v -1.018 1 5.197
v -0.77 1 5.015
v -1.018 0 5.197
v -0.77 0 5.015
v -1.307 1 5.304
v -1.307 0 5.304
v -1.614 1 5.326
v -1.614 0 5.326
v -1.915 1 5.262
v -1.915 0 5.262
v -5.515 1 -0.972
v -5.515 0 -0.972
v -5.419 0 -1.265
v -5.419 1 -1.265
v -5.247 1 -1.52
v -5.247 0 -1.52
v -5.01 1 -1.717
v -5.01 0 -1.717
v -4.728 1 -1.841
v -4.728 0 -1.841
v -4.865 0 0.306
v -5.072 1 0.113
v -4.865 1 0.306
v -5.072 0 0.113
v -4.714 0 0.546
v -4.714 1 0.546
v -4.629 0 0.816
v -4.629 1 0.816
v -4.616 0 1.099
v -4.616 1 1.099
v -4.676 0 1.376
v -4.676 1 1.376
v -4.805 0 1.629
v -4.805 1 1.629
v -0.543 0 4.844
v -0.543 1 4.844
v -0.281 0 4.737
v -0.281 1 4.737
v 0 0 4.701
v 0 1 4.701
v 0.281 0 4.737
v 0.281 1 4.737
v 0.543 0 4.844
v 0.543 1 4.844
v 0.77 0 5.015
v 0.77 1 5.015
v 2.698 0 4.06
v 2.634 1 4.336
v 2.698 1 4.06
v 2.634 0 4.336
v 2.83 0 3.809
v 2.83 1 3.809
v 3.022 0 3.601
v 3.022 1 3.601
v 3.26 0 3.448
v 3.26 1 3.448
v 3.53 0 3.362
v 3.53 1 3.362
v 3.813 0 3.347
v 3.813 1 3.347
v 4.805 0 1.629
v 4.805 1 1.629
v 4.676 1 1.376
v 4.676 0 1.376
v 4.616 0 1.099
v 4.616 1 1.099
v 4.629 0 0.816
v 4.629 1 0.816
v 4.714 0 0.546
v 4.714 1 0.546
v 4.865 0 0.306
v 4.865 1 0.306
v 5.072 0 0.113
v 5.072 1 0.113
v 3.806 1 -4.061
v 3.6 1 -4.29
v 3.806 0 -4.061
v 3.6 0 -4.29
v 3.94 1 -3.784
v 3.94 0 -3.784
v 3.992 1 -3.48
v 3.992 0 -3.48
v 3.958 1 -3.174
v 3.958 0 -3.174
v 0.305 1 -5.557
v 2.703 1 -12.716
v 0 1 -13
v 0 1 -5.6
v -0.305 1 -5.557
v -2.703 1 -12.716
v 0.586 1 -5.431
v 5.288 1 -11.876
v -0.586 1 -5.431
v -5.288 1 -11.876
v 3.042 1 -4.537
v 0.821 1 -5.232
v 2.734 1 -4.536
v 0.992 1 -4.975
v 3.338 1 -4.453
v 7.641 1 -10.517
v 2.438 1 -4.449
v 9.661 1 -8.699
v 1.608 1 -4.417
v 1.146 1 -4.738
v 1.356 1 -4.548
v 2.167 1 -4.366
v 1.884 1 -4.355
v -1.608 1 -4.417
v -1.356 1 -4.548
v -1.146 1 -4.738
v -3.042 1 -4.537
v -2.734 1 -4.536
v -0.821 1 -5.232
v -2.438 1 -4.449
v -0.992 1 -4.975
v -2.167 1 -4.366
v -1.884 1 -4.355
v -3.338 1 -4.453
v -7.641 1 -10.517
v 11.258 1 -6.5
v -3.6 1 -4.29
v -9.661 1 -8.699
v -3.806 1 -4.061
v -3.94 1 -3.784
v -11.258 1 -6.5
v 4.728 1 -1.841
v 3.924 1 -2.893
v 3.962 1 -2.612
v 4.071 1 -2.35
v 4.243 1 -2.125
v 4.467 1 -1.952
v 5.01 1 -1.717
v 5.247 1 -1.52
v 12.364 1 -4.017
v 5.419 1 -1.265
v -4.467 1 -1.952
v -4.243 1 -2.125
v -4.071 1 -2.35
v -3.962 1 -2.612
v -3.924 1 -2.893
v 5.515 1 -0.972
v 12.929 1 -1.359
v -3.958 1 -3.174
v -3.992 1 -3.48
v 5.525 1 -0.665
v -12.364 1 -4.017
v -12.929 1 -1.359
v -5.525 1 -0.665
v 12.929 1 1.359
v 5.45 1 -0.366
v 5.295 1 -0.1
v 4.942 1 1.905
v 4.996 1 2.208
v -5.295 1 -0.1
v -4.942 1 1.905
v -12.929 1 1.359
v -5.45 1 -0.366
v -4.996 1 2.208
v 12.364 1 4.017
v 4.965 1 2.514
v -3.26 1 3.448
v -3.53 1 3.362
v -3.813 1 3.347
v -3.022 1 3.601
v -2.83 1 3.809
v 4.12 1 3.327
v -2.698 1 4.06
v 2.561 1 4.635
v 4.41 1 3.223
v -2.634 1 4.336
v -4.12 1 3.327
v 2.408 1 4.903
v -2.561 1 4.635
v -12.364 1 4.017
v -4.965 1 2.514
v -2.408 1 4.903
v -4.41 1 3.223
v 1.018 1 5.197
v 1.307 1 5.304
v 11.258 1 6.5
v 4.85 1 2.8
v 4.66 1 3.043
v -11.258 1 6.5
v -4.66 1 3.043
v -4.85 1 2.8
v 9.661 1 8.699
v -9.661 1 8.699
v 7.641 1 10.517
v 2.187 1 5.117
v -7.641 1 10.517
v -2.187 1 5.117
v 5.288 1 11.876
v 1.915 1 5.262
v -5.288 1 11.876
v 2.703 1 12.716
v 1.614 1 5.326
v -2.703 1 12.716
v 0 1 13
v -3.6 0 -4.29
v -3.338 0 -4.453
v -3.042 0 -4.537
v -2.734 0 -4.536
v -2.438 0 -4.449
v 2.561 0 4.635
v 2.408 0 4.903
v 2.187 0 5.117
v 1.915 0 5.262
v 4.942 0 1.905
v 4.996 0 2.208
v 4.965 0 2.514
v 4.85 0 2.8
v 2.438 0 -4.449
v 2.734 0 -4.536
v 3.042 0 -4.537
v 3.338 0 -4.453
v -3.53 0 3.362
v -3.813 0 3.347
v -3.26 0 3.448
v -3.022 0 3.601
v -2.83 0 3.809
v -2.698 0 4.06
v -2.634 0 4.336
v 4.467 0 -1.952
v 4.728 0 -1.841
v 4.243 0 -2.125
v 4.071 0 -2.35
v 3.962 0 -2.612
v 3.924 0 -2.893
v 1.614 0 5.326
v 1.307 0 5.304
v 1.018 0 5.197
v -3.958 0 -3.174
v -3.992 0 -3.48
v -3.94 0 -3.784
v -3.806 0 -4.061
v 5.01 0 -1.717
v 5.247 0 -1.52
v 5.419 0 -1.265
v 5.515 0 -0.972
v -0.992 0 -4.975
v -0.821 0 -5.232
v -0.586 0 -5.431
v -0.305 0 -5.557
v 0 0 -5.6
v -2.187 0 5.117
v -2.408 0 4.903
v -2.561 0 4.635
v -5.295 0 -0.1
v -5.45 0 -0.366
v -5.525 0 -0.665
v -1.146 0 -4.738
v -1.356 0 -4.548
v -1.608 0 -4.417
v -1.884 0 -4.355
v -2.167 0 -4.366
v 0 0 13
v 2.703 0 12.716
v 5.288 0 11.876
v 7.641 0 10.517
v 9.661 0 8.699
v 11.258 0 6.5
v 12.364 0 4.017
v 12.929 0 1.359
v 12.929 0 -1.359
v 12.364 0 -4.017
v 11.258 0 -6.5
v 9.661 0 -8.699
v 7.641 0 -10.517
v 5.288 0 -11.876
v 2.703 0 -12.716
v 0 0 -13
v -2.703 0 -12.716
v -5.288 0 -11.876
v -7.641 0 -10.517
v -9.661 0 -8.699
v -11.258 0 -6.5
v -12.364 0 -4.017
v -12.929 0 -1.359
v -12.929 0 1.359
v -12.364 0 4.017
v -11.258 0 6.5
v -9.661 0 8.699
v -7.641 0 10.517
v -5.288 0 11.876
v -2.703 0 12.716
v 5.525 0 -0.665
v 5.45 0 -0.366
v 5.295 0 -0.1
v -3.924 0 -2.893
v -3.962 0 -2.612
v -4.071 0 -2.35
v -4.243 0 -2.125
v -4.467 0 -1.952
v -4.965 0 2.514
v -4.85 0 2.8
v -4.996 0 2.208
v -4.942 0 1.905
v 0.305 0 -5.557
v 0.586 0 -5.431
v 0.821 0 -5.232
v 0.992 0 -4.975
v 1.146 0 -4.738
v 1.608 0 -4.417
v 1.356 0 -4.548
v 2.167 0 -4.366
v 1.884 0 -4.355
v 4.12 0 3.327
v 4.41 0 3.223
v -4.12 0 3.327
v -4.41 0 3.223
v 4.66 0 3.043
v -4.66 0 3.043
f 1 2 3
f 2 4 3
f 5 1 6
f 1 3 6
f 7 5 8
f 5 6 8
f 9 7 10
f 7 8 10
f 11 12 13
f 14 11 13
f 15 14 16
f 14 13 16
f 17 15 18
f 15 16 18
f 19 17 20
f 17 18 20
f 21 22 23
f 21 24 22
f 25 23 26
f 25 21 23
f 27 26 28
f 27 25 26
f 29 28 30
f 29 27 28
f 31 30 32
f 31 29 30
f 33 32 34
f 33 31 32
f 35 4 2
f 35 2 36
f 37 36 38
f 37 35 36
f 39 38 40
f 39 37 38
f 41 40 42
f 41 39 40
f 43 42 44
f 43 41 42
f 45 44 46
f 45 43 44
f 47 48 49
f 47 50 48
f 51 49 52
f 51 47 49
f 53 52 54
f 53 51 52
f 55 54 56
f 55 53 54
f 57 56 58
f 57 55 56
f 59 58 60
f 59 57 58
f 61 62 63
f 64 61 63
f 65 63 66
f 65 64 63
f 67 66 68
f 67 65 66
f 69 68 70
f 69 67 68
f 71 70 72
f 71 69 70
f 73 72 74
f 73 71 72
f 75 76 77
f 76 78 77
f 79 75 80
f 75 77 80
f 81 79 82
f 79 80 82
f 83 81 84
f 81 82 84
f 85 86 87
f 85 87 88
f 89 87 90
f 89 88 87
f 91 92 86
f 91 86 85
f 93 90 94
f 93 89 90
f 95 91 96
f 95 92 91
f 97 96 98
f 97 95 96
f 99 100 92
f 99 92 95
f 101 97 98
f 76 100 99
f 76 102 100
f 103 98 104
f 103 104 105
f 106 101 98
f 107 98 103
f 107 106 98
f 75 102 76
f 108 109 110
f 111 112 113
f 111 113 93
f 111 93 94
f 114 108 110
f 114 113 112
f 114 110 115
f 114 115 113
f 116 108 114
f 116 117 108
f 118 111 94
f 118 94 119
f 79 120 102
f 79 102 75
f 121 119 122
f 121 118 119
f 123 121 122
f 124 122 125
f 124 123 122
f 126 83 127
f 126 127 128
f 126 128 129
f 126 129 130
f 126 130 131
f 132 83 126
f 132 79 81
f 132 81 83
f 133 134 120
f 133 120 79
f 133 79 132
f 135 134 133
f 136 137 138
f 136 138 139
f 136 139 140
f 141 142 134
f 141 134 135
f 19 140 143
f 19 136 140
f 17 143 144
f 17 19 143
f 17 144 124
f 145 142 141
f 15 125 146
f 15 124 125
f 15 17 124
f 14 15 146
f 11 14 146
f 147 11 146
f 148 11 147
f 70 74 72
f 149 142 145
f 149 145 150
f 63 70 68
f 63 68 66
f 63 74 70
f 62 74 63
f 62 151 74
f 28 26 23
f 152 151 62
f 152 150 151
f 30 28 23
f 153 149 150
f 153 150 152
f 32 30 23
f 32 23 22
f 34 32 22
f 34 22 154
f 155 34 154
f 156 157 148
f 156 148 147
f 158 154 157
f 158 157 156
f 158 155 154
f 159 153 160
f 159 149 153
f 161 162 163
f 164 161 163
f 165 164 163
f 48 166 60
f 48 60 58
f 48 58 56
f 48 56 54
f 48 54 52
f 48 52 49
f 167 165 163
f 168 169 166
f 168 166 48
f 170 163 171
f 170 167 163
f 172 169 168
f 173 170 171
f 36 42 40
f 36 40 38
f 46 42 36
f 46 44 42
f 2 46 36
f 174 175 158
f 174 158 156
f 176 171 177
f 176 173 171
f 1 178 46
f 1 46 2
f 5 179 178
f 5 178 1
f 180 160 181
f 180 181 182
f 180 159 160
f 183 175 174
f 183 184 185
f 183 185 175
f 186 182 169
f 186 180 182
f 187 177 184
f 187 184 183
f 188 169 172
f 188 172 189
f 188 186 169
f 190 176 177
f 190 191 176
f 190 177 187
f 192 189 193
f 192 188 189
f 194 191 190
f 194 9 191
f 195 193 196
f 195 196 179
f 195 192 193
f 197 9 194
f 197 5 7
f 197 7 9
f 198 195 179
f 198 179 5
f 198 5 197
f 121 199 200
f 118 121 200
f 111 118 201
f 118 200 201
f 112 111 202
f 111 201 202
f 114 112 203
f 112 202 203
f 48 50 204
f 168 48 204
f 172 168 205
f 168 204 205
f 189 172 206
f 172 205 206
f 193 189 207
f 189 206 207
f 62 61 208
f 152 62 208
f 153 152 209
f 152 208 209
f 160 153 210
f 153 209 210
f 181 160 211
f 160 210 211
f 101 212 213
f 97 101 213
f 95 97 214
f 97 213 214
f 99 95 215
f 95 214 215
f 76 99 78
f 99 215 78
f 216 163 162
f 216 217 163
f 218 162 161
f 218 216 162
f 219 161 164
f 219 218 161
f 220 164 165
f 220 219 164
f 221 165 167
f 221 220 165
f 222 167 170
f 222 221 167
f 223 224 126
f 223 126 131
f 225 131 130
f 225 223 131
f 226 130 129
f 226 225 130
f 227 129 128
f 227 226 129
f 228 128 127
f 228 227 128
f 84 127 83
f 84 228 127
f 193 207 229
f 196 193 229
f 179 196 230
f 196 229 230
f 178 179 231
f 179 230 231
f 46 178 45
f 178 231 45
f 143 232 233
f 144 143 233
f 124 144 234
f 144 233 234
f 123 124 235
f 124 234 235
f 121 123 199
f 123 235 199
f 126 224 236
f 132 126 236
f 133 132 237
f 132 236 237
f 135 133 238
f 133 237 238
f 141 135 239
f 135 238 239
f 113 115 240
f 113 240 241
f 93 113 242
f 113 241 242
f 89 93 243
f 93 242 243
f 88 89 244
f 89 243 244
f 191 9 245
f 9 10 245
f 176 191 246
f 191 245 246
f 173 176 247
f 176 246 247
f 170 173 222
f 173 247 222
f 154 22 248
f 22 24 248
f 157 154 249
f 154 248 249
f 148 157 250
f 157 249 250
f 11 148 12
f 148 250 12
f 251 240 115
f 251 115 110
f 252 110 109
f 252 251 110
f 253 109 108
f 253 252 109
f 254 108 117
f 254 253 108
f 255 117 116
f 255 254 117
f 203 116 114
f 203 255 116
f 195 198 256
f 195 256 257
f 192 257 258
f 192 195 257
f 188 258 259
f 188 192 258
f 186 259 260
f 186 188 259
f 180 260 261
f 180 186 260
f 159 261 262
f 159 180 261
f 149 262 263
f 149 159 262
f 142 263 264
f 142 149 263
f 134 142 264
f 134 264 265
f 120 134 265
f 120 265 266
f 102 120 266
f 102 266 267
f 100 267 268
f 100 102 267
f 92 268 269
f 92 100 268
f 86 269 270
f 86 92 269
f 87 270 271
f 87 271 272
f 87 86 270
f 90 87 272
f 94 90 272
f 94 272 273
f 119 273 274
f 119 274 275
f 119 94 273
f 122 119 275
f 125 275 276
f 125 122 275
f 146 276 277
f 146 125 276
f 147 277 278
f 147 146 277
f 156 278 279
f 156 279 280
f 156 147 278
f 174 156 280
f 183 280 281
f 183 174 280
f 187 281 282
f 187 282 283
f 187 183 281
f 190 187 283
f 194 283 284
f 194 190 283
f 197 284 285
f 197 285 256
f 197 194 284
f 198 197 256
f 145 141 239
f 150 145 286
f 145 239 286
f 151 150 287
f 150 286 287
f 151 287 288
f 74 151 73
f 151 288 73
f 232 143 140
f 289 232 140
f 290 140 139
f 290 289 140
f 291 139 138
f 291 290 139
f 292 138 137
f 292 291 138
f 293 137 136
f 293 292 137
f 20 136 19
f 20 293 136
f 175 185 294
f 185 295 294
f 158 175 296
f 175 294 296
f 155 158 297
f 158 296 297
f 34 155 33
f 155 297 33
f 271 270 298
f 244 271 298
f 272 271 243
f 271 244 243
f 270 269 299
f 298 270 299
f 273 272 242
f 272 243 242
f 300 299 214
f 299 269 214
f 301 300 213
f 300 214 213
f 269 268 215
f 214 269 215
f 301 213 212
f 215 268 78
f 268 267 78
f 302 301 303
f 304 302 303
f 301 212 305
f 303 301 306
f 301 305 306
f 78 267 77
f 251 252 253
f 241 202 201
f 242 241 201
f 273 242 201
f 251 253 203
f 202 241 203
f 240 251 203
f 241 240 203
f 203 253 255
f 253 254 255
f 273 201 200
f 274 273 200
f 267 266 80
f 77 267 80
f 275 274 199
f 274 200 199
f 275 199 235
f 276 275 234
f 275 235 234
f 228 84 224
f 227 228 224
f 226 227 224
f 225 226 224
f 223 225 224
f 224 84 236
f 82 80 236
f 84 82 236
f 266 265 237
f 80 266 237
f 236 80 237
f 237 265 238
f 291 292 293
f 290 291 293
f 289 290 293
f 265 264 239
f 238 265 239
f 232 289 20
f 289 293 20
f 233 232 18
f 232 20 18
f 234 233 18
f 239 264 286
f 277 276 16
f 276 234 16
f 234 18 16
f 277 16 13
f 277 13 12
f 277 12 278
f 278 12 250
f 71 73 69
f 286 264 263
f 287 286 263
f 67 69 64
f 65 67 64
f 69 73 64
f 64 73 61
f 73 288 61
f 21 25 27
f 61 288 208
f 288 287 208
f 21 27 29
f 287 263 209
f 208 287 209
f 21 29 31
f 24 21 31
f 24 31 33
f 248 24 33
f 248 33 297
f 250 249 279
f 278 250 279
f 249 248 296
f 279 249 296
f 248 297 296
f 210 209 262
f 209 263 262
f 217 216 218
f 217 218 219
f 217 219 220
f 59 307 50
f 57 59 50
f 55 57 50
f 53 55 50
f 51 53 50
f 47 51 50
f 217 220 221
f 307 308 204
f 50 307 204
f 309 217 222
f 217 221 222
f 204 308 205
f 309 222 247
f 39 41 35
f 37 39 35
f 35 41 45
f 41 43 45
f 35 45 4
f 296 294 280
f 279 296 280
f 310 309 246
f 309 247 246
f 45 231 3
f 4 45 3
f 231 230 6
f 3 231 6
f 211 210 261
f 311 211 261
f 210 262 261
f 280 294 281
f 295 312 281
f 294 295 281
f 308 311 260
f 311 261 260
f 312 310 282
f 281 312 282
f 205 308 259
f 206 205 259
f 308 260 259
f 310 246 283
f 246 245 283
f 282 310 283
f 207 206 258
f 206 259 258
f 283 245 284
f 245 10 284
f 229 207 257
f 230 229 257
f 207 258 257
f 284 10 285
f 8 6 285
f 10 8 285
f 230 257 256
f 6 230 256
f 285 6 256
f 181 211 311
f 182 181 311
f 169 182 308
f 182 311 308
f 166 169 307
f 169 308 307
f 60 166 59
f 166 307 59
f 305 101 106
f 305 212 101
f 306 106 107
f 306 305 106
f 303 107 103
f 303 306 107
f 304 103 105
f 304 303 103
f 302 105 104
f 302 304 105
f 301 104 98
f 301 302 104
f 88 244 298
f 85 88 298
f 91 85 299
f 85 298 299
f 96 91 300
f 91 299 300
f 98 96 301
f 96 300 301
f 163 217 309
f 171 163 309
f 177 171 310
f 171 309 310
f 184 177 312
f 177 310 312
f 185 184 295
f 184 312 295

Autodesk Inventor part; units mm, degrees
ref_plane "YZ Plane" through (0, 0, 0) normal (1, 0, 0) x (0, 1, 0)
ref_plane "XZ Plane" through (0, 0, 0) normal (0, 1, 0) x (-1, 0, 0)
ref_plane "XY Plane" through (0, 0, 0) normal (0, 0, 1) x (1, 0, 0)
sketch "Skizze1" plane through (0, 0, 0) normal (1, 0, 0) x (0, 1, 0)
  line L0 (0, 0) -> (5, 0)
  line L1 (0, 5.6) -> (0, 13)
  line L2 (0, 13) -> (1, 13)
  line L3 (1, 13) -> (1, 5.6)
  line L4 (0, 5.6) -> (1, 5.6)
  dimension "d0" = 1
  dimension "d1" = 26
  dimension "d55" = 11.2
revolve "Umdrehung1" add sketch "Skizze1" angle 360 about axis through (0, 0, 0) along (0, 1, 0)
sketch "Skizze7" plane through (0, 0, 0) normal (0, 1, 0) x (-1, 0, 0)
  circle A0 centre (0, 0) radius 5.6
  line L0 (0, 0) -> (0, 5.6) construction
  line L1 (0, 0) -> (3.599611, 4.289849) construction
  arc A1 (-0.769545, 5.014619) -> (-1.915313, 5.262279) centre (-1.539091, 4.228617) ccw
  arc A2 (1.915313, 5.262279) -> (0.769545, 5.014619) centre (1.539091, 4.228617) ccw
  arc A3 (-0.769545, 5.014619) -> (0.769545, 5.014619) centre (0, 5.800622) ccw
  line L2 (1.915313, 5.262279) -> (0, 0) construction
  point P0 (0, 0)
  point P1 (0, 4.700622)
  dimension "d75" = 40
  dimension "d76" = 1.1
  dimension "d85" = 1.1
  dimension "d86" = 4.70062
  dimension "d87" = 20
sketch "Skizze7 outline for Extrusion2" plane through (0, 0, 0) normal (0, 1, 0) x (-1, 0, 0)
  arc A0 (-0.769545, 5.014619) -> (0.769545, 5.014619) centre (0, 5.800622) ccw
  arc A1 (-1.915313, 5.262279) -> (-0.769545, 5.014619) centre (-1.539091, 4.228617) cw
  arc A2 (1.915313, 5.262279) -> (-1.915313, 5.262279) centre (0, 0) ccw
  arc A3 (0.769545, 5.014619) -> (1.915313, 5.262279) centre (1.539091, 4.228617) cw
extrude "Extrusion2" add sketch "Skizze7 outline for Extrusion2" along normal up to surface (1 mm away)
pattern_circular "Runde Anordnung1" count 9 over 360 about axis through (0, -10, 0) along (0, 1, 0) of "Extrusion2"
properties part number "Encoder Disk Halter" material "Aluminium 6061"
